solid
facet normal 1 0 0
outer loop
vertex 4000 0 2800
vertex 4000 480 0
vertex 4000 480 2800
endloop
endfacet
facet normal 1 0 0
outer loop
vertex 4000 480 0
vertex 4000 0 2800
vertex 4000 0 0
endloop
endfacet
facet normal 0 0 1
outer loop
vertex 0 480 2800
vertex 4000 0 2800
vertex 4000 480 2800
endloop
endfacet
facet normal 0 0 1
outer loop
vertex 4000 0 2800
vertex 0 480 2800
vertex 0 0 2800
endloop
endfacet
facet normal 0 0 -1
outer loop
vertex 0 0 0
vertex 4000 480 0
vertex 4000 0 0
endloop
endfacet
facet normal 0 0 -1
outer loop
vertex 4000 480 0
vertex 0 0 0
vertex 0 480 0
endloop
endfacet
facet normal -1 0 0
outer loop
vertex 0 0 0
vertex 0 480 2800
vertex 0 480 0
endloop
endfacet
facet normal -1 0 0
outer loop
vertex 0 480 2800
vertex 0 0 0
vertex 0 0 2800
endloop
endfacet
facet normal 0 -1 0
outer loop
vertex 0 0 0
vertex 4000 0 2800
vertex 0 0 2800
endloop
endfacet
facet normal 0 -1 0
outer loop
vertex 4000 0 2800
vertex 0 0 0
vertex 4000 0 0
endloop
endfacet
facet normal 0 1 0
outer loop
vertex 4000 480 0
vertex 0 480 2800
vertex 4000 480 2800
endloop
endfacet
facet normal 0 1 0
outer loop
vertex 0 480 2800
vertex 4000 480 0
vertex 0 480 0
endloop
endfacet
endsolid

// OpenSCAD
// BEHOLD Utilities — Danish wall stack (millimetres)
// Feature-flagged helper. Not structural engineering.
// MinAltan A/S section drawings are reference only (vejledende).

width = 4000;
height = 2800;
exterior = 108;
insulation = 359;
interior = 13;
door = false;
door_w = 900;
door_h = 2100;

module danish_wall() {
    difference() {
        union() {
            color("firebrick") cube([width, exterior, height]);
            translate([0, exterior, 0])
                color("khaki") cube([width, insulation, height]);
            translate([0, exterior + insulation, 0])
                color("white") cube([width, interior, height]);
        }
        if (door) {
            translate([(width - door_w) / 2, -1, 0])
                cube([door_w, exterior + insulation + interior + 2, door_h]);
        }
    }
}

danish_wall();
